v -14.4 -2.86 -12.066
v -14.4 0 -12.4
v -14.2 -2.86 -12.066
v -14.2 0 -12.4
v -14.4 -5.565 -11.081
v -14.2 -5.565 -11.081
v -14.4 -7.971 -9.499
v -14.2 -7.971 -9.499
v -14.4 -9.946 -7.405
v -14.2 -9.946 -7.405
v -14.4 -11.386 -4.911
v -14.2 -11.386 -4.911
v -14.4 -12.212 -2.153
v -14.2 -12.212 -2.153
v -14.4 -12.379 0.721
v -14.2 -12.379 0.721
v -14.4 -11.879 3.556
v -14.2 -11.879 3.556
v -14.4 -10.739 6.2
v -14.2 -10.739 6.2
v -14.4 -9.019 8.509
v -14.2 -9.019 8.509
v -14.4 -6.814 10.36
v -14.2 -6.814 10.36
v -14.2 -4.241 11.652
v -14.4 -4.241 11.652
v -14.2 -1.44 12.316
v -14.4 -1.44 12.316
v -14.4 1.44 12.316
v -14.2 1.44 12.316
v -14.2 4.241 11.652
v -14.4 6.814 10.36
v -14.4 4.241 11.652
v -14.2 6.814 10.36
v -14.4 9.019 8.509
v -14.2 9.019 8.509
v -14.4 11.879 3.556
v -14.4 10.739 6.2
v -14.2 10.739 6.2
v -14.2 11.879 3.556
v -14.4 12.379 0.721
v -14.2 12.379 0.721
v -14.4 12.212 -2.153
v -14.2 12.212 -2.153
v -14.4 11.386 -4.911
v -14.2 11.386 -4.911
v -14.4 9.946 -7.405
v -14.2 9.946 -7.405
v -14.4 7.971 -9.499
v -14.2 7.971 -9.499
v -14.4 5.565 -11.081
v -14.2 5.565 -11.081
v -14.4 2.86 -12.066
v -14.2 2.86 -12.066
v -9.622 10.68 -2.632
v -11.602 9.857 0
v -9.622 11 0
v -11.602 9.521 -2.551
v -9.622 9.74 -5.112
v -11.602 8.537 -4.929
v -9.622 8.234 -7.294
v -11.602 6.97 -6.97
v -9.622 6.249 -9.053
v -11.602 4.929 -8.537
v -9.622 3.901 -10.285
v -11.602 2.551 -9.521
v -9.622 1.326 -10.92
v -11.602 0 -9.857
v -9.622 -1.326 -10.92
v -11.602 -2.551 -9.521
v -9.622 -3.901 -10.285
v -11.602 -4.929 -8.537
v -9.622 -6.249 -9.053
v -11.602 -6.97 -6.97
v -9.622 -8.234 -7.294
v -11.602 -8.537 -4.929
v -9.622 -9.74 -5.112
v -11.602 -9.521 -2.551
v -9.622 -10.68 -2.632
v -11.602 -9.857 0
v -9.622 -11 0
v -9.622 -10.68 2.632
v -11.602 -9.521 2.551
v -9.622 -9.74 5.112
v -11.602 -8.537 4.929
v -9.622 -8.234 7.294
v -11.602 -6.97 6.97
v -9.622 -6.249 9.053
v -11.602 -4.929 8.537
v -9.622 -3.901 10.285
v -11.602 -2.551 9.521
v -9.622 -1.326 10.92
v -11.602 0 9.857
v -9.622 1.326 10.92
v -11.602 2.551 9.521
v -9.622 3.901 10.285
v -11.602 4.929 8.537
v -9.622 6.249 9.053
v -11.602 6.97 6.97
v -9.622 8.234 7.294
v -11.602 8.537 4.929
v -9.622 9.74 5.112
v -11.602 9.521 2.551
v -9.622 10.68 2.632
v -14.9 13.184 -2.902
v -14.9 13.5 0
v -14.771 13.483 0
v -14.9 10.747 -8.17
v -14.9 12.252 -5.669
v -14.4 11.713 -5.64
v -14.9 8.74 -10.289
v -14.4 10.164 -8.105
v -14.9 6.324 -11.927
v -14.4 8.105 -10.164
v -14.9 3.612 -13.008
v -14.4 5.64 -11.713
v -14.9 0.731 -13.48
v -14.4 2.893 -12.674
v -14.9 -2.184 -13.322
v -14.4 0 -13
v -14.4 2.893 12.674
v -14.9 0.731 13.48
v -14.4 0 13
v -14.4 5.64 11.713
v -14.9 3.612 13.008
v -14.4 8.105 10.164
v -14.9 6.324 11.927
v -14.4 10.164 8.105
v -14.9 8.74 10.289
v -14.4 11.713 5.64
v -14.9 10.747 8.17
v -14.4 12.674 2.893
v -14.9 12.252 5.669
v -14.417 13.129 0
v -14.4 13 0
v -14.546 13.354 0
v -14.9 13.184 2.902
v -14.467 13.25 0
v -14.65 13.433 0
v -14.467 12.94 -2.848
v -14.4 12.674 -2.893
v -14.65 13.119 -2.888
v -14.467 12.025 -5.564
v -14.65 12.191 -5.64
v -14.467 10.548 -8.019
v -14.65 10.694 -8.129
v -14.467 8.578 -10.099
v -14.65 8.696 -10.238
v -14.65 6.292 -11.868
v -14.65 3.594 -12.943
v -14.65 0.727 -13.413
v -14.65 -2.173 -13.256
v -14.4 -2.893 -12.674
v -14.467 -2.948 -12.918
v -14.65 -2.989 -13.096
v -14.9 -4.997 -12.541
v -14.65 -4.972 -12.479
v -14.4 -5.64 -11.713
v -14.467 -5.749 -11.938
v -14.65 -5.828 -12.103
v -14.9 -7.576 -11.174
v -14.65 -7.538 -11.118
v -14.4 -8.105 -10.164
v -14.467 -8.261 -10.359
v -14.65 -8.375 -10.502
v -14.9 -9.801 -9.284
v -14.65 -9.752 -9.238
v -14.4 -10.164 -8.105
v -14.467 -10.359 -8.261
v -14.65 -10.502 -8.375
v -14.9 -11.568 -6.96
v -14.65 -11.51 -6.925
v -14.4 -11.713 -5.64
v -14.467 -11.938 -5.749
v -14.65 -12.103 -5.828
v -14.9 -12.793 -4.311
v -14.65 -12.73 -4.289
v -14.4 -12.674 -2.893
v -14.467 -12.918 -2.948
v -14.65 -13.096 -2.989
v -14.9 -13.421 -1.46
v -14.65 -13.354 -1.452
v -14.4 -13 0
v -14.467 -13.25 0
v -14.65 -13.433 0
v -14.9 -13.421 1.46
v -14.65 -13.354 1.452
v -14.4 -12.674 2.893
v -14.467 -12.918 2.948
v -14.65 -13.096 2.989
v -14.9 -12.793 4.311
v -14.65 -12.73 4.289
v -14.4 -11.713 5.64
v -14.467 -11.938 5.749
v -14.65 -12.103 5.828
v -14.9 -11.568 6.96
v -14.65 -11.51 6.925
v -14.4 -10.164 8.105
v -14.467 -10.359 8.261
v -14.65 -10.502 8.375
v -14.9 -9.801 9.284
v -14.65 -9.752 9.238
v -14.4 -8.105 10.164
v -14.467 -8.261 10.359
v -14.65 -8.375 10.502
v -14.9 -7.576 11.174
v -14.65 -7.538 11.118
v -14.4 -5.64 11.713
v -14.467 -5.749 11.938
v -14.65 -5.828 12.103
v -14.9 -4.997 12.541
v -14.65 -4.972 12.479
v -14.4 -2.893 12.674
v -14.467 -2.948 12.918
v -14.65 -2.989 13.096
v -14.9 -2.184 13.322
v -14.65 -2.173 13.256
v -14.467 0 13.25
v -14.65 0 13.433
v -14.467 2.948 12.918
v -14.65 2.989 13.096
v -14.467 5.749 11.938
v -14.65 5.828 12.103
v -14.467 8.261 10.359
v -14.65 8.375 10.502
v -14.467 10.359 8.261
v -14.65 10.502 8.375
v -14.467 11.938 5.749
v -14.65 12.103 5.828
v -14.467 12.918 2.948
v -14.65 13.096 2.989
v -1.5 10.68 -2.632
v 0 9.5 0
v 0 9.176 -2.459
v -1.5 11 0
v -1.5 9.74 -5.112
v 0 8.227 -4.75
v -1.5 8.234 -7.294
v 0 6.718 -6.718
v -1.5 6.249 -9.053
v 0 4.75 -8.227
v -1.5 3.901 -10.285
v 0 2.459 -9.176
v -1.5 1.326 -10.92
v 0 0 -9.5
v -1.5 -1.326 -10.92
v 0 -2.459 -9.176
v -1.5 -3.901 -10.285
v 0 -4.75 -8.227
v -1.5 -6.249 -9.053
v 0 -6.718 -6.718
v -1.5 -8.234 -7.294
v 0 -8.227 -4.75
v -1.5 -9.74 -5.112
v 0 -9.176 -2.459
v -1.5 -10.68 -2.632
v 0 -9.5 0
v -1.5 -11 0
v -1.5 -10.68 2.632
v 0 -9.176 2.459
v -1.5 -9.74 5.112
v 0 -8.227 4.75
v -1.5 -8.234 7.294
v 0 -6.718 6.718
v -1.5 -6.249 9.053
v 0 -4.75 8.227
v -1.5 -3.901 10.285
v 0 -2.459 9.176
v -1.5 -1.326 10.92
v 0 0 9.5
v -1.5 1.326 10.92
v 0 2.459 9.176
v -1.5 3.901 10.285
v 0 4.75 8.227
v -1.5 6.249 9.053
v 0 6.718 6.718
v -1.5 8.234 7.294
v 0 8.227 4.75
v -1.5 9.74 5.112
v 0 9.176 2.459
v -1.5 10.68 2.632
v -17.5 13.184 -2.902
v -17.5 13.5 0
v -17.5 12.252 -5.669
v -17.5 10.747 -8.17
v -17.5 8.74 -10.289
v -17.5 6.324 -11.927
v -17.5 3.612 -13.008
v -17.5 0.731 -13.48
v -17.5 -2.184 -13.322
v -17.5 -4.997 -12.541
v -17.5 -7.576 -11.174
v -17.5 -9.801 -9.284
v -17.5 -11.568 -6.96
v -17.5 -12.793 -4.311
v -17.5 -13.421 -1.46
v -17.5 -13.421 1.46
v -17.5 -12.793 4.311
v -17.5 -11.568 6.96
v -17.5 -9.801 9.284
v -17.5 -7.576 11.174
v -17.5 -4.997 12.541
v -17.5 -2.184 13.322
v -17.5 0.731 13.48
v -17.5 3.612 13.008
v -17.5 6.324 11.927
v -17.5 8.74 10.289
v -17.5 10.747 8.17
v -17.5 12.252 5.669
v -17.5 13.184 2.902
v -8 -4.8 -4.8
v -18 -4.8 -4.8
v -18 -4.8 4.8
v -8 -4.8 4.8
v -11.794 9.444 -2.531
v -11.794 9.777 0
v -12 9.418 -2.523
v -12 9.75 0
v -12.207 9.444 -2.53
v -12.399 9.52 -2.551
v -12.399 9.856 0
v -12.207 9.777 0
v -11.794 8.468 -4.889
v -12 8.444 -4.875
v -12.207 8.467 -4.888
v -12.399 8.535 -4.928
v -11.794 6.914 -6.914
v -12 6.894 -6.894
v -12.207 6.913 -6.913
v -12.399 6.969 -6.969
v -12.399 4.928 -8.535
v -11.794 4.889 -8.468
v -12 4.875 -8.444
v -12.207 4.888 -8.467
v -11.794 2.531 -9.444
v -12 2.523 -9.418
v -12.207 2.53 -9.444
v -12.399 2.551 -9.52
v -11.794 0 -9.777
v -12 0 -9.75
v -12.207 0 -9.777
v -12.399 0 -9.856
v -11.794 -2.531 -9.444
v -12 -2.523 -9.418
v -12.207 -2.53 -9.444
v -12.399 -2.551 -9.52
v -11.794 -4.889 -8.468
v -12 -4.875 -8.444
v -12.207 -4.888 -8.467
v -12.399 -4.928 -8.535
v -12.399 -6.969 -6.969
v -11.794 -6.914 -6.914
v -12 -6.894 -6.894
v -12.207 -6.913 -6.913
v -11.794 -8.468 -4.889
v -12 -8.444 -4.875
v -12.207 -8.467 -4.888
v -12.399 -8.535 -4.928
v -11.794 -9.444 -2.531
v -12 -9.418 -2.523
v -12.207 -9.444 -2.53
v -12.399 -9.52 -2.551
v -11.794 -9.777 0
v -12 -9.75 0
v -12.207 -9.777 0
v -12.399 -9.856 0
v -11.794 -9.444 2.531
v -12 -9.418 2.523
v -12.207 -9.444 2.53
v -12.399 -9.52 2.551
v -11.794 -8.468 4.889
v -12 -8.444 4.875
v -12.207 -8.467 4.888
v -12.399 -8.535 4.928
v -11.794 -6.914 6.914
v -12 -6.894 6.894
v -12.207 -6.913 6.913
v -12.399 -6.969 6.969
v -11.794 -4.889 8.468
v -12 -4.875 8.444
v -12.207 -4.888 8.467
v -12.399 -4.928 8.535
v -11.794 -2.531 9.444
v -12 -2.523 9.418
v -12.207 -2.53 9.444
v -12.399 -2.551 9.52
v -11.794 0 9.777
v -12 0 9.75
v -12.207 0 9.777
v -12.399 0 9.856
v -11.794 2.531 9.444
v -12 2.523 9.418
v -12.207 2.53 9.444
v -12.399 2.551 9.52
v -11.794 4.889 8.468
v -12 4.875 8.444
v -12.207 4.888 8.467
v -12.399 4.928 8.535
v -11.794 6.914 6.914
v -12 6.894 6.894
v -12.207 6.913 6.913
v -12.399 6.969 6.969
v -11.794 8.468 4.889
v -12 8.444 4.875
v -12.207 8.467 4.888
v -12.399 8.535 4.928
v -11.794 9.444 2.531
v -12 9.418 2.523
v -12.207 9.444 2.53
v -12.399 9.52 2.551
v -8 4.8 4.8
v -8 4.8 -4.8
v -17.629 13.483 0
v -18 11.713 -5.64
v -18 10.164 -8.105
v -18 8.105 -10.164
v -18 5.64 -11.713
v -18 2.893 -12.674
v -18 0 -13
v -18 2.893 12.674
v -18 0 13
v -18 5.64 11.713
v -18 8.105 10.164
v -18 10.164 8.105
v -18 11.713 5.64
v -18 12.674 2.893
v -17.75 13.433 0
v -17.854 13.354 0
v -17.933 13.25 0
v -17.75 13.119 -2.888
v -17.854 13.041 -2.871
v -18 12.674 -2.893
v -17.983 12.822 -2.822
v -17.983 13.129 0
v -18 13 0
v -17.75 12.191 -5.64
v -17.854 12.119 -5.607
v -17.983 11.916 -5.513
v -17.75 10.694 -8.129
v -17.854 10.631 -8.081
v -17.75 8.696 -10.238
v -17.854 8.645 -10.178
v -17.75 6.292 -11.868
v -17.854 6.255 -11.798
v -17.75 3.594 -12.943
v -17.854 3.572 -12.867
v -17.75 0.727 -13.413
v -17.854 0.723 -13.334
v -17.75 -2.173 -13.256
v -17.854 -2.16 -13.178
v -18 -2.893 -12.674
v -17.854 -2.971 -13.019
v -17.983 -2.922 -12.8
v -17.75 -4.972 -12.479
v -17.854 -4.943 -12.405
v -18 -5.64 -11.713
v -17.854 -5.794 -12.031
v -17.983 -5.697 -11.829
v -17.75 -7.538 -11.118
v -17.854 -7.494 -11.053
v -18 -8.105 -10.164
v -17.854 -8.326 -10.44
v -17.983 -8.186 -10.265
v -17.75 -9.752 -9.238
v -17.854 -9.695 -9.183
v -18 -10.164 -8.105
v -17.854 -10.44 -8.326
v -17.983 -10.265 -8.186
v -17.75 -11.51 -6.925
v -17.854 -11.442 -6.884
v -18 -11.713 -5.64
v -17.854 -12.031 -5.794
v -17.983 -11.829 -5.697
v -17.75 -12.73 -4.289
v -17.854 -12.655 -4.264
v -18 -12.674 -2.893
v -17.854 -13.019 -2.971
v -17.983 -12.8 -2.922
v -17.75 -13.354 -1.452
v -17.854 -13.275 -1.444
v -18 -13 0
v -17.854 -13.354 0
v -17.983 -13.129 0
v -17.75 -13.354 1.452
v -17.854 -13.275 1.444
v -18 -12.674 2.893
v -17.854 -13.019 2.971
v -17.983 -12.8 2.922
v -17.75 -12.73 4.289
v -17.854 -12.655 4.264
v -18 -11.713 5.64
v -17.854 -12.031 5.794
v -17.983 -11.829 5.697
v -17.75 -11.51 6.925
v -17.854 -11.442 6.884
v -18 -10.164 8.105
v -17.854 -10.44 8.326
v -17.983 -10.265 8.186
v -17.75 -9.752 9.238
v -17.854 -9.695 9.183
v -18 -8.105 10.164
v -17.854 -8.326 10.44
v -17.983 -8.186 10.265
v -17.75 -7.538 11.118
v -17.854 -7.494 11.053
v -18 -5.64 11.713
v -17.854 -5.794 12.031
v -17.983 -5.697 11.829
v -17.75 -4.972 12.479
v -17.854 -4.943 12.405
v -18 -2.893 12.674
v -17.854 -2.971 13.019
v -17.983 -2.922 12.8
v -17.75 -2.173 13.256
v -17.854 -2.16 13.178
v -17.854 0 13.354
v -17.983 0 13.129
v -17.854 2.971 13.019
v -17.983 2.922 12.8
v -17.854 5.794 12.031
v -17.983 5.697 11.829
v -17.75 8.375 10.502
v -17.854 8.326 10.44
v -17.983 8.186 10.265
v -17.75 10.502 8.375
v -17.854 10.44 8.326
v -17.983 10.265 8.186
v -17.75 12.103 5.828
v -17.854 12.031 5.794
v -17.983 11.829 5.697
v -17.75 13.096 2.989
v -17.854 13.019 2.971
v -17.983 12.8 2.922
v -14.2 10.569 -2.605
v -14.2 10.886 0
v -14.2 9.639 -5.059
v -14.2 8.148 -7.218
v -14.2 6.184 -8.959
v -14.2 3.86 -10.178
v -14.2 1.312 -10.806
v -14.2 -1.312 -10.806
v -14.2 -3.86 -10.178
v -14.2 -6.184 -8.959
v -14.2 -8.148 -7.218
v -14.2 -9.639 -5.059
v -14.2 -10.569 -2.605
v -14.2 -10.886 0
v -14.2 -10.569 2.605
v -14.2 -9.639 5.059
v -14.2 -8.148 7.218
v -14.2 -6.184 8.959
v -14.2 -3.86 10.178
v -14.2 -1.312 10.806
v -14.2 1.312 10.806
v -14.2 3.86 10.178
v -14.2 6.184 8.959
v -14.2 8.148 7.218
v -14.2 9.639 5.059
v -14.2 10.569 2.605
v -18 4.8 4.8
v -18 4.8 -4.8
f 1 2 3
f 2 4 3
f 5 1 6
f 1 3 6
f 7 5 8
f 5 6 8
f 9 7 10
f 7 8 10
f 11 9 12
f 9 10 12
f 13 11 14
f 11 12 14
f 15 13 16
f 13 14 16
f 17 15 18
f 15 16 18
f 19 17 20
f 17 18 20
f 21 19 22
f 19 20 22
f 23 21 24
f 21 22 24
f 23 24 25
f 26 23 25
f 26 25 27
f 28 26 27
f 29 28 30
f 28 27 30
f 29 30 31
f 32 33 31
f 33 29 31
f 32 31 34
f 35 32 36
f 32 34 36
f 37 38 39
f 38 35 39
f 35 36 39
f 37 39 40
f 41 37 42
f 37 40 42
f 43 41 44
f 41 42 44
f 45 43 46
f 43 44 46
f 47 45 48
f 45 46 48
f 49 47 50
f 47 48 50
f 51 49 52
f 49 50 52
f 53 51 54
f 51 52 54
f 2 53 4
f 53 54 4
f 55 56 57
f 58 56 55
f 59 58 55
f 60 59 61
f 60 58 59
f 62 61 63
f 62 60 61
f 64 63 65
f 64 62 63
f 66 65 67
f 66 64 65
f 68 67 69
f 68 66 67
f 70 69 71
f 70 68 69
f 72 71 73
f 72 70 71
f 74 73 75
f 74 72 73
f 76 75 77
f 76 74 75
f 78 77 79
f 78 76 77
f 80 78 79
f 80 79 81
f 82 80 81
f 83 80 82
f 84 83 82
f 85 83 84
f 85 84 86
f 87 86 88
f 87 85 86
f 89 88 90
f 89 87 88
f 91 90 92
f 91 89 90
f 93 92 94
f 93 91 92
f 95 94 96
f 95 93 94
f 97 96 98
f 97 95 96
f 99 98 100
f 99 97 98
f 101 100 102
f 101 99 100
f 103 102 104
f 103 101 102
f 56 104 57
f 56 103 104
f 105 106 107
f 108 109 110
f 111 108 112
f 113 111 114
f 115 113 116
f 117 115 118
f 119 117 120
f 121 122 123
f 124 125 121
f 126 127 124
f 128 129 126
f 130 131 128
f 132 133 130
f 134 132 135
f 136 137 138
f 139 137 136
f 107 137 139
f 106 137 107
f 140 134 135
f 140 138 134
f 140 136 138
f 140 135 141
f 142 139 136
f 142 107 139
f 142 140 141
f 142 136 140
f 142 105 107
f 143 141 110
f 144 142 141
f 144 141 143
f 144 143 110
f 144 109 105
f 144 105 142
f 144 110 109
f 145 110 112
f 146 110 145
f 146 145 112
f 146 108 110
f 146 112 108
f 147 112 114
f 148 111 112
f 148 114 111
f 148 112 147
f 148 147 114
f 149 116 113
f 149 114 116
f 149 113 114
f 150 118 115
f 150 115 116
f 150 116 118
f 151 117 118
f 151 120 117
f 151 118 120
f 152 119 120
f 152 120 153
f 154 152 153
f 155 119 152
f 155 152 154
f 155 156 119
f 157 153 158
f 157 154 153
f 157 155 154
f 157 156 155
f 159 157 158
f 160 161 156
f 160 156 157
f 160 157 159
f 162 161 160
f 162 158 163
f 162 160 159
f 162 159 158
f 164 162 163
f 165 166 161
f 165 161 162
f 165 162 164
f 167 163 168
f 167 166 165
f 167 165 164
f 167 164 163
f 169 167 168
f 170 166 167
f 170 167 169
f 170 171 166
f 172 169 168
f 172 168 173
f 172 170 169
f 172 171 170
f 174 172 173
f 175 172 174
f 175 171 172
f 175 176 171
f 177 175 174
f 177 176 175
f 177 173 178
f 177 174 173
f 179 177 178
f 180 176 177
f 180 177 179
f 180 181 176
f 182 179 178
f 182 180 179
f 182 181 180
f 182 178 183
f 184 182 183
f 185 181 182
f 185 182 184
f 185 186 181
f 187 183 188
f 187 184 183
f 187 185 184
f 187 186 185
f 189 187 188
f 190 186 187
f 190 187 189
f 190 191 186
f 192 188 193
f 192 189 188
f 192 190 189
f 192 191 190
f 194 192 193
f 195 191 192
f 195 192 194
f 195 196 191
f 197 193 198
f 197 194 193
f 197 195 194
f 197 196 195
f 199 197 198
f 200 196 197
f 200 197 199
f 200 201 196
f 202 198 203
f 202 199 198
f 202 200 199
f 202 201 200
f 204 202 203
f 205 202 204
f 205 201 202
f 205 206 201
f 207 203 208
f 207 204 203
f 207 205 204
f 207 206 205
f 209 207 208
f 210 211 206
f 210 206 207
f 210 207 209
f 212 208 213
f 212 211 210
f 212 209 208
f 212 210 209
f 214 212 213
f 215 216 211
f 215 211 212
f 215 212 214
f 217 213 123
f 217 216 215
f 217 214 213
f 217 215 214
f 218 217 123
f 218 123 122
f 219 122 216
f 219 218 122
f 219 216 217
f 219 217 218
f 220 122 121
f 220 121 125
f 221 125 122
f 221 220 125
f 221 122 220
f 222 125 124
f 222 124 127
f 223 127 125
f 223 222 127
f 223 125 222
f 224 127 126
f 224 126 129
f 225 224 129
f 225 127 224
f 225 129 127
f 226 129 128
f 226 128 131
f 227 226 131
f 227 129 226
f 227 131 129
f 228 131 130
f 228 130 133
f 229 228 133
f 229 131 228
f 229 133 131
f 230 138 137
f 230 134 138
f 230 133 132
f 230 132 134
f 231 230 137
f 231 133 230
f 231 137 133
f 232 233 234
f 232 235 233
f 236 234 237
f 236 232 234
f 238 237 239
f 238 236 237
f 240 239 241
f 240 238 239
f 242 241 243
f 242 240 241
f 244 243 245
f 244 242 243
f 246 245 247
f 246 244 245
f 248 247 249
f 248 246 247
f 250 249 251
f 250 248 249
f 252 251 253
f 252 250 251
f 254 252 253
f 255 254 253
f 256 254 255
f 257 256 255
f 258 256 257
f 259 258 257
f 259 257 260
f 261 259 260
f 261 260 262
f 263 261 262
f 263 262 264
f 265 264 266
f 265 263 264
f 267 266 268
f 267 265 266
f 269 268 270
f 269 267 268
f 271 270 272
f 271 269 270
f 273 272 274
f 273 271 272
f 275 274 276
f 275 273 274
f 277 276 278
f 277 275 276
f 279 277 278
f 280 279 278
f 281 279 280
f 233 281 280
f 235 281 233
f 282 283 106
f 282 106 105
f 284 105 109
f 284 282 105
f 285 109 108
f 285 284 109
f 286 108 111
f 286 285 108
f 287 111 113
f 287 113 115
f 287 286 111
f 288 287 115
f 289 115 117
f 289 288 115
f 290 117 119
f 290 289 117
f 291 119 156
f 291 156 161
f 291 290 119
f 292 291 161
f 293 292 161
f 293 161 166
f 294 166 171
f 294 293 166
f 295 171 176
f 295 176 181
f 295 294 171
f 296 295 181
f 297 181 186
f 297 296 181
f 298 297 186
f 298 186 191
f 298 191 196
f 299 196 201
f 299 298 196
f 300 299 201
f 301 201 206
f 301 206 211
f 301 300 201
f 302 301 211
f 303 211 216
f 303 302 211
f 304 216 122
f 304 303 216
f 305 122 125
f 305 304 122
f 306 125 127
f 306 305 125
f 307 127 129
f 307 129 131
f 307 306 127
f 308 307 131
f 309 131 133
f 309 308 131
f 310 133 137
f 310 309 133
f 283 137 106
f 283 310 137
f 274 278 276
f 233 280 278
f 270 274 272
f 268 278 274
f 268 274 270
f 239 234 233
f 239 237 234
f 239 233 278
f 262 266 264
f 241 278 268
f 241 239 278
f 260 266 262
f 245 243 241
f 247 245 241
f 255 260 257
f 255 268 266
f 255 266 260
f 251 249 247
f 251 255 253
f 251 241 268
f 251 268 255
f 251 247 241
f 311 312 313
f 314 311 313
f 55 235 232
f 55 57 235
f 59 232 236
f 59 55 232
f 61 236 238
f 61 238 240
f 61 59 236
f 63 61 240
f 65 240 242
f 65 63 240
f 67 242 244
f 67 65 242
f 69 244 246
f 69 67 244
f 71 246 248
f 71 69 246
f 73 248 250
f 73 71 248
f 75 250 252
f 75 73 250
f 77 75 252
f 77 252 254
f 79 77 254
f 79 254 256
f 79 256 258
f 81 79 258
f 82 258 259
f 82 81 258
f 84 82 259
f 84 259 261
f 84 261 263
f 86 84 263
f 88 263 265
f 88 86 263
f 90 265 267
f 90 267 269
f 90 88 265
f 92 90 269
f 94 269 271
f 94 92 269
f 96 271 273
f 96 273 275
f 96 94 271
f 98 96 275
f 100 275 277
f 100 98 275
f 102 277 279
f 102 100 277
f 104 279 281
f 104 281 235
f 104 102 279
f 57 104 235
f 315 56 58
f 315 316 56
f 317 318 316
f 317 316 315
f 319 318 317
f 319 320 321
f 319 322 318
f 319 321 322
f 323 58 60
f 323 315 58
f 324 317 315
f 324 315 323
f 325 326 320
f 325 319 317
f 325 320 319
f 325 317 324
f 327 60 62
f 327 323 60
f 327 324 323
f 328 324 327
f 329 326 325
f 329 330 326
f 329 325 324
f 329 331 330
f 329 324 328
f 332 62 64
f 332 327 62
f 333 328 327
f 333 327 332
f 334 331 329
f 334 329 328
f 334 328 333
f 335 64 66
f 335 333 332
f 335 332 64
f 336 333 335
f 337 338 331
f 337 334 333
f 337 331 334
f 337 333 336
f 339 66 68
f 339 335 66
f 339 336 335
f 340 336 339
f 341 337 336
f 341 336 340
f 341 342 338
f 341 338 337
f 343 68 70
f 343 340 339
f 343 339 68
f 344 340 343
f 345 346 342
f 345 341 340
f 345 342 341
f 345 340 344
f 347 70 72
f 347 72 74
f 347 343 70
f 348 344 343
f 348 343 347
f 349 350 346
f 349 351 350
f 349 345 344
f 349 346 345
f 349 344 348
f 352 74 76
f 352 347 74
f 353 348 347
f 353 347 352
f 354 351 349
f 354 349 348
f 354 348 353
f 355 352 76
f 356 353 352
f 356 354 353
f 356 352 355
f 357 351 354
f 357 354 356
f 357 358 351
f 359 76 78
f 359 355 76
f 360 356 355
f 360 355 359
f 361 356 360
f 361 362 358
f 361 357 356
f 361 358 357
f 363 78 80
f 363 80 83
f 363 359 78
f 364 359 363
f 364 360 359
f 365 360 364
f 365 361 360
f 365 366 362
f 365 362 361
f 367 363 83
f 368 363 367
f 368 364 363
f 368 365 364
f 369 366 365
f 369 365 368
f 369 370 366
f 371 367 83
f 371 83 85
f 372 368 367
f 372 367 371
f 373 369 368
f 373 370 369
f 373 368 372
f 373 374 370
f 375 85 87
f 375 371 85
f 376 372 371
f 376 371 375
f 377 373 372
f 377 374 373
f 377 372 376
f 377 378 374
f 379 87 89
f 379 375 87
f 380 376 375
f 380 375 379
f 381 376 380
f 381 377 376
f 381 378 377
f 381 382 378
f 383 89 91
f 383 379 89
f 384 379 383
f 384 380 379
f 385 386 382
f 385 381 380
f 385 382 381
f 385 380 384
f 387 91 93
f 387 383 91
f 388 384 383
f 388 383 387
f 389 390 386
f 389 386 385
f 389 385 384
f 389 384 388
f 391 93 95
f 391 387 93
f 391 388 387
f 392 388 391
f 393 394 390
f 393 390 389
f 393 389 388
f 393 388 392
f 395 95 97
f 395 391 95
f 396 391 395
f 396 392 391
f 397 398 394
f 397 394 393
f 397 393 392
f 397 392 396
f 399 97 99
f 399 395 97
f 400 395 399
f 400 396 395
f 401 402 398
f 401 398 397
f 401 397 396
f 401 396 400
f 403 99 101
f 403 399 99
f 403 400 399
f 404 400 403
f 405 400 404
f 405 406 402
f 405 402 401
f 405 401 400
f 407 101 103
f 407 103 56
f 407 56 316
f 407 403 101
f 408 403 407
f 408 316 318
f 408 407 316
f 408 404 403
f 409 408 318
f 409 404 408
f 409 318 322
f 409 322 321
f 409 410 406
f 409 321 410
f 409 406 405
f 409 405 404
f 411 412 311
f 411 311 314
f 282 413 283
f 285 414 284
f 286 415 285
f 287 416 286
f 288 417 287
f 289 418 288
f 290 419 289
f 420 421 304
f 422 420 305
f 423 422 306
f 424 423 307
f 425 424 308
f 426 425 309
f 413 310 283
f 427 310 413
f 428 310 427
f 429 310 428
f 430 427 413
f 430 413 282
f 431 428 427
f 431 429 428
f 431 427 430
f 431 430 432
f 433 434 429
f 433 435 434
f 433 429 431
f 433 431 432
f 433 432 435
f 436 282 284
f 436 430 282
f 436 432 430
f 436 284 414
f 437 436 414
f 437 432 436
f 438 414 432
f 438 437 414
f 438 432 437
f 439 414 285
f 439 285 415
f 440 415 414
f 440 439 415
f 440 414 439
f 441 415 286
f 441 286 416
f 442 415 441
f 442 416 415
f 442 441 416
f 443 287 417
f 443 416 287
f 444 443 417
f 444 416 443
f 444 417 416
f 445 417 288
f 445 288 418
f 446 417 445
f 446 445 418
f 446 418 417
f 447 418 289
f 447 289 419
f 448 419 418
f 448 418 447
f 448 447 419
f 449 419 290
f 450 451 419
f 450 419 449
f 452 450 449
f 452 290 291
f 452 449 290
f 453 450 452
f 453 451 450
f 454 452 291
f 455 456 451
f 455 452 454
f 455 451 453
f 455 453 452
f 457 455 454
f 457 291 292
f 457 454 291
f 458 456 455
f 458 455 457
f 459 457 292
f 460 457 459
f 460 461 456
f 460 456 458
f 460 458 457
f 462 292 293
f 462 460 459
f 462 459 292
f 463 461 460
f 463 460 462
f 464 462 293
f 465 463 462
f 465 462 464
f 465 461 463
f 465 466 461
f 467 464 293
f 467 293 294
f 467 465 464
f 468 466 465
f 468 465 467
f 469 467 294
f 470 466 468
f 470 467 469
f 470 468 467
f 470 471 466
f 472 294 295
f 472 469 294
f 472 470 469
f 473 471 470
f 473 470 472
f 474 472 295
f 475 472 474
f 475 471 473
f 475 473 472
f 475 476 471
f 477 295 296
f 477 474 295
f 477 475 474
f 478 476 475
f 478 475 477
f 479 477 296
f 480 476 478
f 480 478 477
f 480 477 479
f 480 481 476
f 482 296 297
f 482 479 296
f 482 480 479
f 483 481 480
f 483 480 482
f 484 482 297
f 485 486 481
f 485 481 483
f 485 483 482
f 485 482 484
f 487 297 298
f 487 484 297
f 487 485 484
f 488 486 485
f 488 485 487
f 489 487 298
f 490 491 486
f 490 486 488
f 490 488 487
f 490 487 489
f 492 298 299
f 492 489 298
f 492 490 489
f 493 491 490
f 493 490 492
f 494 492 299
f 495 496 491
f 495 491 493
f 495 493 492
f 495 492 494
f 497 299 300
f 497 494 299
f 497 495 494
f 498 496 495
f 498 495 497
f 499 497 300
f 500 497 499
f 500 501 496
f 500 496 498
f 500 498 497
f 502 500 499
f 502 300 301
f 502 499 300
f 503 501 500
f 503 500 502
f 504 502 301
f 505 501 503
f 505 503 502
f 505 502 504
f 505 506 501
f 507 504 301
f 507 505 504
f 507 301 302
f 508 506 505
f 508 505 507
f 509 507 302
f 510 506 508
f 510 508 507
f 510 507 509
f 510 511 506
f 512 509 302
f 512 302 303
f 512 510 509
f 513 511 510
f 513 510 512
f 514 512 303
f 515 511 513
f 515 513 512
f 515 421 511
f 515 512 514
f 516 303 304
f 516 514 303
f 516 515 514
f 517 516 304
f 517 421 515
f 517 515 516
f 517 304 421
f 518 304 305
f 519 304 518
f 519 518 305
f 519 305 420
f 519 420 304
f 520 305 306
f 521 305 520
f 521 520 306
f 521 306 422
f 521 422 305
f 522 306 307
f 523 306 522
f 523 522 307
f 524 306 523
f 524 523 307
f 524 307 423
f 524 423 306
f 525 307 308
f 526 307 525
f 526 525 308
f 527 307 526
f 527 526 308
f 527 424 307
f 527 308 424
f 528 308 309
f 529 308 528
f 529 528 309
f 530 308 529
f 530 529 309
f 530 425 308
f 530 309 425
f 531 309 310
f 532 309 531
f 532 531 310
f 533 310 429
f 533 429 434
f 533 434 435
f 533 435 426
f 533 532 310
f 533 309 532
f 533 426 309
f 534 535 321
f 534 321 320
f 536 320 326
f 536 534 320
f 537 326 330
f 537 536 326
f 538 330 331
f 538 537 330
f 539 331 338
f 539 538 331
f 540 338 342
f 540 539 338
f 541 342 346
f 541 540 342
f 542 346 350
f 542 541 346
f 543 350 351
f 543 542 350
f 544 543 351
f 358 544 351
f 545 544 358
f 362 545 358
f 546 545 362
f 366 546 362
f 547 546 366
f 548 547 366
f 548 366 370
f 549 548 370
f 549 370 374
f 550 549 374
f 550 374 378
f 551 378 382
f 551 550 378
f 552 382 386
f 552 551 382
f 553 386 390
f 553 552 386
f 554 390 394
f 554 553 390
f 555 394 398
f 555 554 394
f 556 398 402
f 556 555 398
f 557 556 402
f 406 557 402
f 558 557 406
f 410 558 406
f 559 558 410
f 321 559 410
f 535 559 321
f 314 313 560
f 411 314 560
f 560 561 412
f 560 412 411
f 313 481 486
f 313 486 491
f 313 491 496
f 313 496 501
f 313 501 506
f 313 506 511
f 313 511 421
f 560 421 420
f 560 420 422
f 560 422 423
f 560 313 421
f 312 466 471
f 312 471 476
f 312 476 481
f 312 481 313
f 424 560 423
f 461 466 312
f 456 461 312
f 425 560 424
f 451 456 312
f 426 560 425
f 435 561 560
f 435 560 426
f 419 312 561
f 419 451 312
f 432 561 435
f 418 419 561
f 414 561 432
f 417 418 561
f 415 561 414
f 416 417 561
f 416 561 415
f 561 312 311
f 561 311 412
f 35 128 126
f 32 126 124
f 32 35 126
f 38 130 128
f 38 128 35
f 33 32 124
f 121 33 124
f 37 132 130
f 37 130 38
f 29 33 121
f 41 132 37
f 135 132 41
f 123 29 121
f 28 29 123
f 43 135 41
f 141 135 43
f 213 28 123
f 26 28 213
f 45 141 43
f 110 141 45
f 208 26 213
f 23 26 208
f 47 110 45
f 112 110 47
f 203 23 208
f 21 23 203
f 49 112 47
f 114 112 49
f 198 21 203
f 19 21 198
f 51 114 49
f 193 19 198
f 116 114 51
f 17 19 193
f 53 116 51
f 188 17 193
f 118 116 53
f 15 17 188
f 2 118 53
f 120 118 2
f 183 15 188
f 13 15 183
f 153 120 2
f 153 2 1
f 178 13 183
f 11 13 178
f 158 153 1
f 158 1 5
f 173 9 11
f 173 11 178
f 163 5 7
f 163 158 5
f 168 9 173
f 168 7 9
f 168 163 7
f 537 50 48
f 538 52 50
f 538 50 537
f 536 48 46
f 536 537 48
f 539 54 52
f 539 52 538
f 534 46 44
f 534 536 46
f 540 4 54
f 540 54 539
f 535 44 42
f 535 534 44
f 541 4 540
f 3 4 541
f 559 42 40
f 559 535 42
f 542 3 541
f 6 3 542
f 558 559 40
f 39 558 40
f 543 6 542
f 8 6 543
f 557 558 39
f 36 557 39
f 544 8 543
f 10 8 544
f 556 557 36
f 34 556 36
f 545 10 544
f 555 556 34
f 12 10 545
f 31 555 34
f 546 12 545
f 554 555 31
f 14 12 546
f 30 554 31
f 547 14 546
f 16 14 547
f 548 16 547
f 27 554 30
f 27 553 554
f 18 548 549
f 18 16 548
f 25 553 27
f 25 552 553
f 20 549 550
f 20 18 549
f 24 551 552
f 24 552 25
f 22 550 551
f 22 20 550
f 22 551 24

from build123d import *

# Parameters (mm, degrees)
SKETCH2_W          = 9.6
SKETCH2_H          = 9.6
CUT_EXTRUDE1_DEPTH = 10
FILLET1_R          = 0.5
SKETCH3_W          = 1.5
SKETCH3_H          = 2


with BuildPart() as part:
    # Sketch1 → Revolve1 (revolve)
    with BuildSketch(Plane.XY):
        with BuildLine():
            Line((0, 0), (0, 9.5))
            Line((0, 9.5), (-1.5, 11))
            Line((-1.5, 11), (-9.622450166, 11))
            Line((-9.622450166, 11), (-11.60187303, 9.857179677))
            ThreePointArc((-11.60187303, 9.857179677), (-12.000249041, 9.750001648), (-12.399056907, 9.855561401))
            Line((-12.399056907, 9.855561401), (-14.4, 11))
            Line((-14.4, 11), (-14.4, 13.5))
            Line((-14.4, 13.5), (-18, 13.5))
            Line((-18, 13.5), (-18, 0))
            Line((-18, 0), (0, 0))
        make_face()
    revolve(axis=Axis((0, 0, 0), (-1, 0, 0)))

    # Sketch2 → Cut-Extrude1 (cut)
    with BuildSketch(Plane.ZY.offset(18)):
        Rectangle(SKETCH2_W, SKETCH2_H)
    extrude(amount=-CUT_EXTRUDE1_DEPTH, mode=Mode.SUBTRACT)

    # Fillet1
    fillet1_edges = [part.edges().sort_by_distance(p)[0] for p in [
        (-14.4, -13.5, 0),
        (-18, -13.5, 0),
    ]]
    fillet(fillet1_edges, radius=FILLET1_R)

    # Sketch3 → Revolve2 (revolve)
    with BuildSketch(Plane.XY, mode=Mode.PRIVATE) as revolve2_sk:
        with Locations((-14.95, 11.4)):
            Rectangle(SKETCH3_W, SKETCH3_H)
    revolve(revolve2_sk.sketch.rotate(Axis((0, 0, 0), (-1, 0, 0)), 90), axis=Axis((0, 0, 0), (-1, 0, 0)))


solid = part.part
